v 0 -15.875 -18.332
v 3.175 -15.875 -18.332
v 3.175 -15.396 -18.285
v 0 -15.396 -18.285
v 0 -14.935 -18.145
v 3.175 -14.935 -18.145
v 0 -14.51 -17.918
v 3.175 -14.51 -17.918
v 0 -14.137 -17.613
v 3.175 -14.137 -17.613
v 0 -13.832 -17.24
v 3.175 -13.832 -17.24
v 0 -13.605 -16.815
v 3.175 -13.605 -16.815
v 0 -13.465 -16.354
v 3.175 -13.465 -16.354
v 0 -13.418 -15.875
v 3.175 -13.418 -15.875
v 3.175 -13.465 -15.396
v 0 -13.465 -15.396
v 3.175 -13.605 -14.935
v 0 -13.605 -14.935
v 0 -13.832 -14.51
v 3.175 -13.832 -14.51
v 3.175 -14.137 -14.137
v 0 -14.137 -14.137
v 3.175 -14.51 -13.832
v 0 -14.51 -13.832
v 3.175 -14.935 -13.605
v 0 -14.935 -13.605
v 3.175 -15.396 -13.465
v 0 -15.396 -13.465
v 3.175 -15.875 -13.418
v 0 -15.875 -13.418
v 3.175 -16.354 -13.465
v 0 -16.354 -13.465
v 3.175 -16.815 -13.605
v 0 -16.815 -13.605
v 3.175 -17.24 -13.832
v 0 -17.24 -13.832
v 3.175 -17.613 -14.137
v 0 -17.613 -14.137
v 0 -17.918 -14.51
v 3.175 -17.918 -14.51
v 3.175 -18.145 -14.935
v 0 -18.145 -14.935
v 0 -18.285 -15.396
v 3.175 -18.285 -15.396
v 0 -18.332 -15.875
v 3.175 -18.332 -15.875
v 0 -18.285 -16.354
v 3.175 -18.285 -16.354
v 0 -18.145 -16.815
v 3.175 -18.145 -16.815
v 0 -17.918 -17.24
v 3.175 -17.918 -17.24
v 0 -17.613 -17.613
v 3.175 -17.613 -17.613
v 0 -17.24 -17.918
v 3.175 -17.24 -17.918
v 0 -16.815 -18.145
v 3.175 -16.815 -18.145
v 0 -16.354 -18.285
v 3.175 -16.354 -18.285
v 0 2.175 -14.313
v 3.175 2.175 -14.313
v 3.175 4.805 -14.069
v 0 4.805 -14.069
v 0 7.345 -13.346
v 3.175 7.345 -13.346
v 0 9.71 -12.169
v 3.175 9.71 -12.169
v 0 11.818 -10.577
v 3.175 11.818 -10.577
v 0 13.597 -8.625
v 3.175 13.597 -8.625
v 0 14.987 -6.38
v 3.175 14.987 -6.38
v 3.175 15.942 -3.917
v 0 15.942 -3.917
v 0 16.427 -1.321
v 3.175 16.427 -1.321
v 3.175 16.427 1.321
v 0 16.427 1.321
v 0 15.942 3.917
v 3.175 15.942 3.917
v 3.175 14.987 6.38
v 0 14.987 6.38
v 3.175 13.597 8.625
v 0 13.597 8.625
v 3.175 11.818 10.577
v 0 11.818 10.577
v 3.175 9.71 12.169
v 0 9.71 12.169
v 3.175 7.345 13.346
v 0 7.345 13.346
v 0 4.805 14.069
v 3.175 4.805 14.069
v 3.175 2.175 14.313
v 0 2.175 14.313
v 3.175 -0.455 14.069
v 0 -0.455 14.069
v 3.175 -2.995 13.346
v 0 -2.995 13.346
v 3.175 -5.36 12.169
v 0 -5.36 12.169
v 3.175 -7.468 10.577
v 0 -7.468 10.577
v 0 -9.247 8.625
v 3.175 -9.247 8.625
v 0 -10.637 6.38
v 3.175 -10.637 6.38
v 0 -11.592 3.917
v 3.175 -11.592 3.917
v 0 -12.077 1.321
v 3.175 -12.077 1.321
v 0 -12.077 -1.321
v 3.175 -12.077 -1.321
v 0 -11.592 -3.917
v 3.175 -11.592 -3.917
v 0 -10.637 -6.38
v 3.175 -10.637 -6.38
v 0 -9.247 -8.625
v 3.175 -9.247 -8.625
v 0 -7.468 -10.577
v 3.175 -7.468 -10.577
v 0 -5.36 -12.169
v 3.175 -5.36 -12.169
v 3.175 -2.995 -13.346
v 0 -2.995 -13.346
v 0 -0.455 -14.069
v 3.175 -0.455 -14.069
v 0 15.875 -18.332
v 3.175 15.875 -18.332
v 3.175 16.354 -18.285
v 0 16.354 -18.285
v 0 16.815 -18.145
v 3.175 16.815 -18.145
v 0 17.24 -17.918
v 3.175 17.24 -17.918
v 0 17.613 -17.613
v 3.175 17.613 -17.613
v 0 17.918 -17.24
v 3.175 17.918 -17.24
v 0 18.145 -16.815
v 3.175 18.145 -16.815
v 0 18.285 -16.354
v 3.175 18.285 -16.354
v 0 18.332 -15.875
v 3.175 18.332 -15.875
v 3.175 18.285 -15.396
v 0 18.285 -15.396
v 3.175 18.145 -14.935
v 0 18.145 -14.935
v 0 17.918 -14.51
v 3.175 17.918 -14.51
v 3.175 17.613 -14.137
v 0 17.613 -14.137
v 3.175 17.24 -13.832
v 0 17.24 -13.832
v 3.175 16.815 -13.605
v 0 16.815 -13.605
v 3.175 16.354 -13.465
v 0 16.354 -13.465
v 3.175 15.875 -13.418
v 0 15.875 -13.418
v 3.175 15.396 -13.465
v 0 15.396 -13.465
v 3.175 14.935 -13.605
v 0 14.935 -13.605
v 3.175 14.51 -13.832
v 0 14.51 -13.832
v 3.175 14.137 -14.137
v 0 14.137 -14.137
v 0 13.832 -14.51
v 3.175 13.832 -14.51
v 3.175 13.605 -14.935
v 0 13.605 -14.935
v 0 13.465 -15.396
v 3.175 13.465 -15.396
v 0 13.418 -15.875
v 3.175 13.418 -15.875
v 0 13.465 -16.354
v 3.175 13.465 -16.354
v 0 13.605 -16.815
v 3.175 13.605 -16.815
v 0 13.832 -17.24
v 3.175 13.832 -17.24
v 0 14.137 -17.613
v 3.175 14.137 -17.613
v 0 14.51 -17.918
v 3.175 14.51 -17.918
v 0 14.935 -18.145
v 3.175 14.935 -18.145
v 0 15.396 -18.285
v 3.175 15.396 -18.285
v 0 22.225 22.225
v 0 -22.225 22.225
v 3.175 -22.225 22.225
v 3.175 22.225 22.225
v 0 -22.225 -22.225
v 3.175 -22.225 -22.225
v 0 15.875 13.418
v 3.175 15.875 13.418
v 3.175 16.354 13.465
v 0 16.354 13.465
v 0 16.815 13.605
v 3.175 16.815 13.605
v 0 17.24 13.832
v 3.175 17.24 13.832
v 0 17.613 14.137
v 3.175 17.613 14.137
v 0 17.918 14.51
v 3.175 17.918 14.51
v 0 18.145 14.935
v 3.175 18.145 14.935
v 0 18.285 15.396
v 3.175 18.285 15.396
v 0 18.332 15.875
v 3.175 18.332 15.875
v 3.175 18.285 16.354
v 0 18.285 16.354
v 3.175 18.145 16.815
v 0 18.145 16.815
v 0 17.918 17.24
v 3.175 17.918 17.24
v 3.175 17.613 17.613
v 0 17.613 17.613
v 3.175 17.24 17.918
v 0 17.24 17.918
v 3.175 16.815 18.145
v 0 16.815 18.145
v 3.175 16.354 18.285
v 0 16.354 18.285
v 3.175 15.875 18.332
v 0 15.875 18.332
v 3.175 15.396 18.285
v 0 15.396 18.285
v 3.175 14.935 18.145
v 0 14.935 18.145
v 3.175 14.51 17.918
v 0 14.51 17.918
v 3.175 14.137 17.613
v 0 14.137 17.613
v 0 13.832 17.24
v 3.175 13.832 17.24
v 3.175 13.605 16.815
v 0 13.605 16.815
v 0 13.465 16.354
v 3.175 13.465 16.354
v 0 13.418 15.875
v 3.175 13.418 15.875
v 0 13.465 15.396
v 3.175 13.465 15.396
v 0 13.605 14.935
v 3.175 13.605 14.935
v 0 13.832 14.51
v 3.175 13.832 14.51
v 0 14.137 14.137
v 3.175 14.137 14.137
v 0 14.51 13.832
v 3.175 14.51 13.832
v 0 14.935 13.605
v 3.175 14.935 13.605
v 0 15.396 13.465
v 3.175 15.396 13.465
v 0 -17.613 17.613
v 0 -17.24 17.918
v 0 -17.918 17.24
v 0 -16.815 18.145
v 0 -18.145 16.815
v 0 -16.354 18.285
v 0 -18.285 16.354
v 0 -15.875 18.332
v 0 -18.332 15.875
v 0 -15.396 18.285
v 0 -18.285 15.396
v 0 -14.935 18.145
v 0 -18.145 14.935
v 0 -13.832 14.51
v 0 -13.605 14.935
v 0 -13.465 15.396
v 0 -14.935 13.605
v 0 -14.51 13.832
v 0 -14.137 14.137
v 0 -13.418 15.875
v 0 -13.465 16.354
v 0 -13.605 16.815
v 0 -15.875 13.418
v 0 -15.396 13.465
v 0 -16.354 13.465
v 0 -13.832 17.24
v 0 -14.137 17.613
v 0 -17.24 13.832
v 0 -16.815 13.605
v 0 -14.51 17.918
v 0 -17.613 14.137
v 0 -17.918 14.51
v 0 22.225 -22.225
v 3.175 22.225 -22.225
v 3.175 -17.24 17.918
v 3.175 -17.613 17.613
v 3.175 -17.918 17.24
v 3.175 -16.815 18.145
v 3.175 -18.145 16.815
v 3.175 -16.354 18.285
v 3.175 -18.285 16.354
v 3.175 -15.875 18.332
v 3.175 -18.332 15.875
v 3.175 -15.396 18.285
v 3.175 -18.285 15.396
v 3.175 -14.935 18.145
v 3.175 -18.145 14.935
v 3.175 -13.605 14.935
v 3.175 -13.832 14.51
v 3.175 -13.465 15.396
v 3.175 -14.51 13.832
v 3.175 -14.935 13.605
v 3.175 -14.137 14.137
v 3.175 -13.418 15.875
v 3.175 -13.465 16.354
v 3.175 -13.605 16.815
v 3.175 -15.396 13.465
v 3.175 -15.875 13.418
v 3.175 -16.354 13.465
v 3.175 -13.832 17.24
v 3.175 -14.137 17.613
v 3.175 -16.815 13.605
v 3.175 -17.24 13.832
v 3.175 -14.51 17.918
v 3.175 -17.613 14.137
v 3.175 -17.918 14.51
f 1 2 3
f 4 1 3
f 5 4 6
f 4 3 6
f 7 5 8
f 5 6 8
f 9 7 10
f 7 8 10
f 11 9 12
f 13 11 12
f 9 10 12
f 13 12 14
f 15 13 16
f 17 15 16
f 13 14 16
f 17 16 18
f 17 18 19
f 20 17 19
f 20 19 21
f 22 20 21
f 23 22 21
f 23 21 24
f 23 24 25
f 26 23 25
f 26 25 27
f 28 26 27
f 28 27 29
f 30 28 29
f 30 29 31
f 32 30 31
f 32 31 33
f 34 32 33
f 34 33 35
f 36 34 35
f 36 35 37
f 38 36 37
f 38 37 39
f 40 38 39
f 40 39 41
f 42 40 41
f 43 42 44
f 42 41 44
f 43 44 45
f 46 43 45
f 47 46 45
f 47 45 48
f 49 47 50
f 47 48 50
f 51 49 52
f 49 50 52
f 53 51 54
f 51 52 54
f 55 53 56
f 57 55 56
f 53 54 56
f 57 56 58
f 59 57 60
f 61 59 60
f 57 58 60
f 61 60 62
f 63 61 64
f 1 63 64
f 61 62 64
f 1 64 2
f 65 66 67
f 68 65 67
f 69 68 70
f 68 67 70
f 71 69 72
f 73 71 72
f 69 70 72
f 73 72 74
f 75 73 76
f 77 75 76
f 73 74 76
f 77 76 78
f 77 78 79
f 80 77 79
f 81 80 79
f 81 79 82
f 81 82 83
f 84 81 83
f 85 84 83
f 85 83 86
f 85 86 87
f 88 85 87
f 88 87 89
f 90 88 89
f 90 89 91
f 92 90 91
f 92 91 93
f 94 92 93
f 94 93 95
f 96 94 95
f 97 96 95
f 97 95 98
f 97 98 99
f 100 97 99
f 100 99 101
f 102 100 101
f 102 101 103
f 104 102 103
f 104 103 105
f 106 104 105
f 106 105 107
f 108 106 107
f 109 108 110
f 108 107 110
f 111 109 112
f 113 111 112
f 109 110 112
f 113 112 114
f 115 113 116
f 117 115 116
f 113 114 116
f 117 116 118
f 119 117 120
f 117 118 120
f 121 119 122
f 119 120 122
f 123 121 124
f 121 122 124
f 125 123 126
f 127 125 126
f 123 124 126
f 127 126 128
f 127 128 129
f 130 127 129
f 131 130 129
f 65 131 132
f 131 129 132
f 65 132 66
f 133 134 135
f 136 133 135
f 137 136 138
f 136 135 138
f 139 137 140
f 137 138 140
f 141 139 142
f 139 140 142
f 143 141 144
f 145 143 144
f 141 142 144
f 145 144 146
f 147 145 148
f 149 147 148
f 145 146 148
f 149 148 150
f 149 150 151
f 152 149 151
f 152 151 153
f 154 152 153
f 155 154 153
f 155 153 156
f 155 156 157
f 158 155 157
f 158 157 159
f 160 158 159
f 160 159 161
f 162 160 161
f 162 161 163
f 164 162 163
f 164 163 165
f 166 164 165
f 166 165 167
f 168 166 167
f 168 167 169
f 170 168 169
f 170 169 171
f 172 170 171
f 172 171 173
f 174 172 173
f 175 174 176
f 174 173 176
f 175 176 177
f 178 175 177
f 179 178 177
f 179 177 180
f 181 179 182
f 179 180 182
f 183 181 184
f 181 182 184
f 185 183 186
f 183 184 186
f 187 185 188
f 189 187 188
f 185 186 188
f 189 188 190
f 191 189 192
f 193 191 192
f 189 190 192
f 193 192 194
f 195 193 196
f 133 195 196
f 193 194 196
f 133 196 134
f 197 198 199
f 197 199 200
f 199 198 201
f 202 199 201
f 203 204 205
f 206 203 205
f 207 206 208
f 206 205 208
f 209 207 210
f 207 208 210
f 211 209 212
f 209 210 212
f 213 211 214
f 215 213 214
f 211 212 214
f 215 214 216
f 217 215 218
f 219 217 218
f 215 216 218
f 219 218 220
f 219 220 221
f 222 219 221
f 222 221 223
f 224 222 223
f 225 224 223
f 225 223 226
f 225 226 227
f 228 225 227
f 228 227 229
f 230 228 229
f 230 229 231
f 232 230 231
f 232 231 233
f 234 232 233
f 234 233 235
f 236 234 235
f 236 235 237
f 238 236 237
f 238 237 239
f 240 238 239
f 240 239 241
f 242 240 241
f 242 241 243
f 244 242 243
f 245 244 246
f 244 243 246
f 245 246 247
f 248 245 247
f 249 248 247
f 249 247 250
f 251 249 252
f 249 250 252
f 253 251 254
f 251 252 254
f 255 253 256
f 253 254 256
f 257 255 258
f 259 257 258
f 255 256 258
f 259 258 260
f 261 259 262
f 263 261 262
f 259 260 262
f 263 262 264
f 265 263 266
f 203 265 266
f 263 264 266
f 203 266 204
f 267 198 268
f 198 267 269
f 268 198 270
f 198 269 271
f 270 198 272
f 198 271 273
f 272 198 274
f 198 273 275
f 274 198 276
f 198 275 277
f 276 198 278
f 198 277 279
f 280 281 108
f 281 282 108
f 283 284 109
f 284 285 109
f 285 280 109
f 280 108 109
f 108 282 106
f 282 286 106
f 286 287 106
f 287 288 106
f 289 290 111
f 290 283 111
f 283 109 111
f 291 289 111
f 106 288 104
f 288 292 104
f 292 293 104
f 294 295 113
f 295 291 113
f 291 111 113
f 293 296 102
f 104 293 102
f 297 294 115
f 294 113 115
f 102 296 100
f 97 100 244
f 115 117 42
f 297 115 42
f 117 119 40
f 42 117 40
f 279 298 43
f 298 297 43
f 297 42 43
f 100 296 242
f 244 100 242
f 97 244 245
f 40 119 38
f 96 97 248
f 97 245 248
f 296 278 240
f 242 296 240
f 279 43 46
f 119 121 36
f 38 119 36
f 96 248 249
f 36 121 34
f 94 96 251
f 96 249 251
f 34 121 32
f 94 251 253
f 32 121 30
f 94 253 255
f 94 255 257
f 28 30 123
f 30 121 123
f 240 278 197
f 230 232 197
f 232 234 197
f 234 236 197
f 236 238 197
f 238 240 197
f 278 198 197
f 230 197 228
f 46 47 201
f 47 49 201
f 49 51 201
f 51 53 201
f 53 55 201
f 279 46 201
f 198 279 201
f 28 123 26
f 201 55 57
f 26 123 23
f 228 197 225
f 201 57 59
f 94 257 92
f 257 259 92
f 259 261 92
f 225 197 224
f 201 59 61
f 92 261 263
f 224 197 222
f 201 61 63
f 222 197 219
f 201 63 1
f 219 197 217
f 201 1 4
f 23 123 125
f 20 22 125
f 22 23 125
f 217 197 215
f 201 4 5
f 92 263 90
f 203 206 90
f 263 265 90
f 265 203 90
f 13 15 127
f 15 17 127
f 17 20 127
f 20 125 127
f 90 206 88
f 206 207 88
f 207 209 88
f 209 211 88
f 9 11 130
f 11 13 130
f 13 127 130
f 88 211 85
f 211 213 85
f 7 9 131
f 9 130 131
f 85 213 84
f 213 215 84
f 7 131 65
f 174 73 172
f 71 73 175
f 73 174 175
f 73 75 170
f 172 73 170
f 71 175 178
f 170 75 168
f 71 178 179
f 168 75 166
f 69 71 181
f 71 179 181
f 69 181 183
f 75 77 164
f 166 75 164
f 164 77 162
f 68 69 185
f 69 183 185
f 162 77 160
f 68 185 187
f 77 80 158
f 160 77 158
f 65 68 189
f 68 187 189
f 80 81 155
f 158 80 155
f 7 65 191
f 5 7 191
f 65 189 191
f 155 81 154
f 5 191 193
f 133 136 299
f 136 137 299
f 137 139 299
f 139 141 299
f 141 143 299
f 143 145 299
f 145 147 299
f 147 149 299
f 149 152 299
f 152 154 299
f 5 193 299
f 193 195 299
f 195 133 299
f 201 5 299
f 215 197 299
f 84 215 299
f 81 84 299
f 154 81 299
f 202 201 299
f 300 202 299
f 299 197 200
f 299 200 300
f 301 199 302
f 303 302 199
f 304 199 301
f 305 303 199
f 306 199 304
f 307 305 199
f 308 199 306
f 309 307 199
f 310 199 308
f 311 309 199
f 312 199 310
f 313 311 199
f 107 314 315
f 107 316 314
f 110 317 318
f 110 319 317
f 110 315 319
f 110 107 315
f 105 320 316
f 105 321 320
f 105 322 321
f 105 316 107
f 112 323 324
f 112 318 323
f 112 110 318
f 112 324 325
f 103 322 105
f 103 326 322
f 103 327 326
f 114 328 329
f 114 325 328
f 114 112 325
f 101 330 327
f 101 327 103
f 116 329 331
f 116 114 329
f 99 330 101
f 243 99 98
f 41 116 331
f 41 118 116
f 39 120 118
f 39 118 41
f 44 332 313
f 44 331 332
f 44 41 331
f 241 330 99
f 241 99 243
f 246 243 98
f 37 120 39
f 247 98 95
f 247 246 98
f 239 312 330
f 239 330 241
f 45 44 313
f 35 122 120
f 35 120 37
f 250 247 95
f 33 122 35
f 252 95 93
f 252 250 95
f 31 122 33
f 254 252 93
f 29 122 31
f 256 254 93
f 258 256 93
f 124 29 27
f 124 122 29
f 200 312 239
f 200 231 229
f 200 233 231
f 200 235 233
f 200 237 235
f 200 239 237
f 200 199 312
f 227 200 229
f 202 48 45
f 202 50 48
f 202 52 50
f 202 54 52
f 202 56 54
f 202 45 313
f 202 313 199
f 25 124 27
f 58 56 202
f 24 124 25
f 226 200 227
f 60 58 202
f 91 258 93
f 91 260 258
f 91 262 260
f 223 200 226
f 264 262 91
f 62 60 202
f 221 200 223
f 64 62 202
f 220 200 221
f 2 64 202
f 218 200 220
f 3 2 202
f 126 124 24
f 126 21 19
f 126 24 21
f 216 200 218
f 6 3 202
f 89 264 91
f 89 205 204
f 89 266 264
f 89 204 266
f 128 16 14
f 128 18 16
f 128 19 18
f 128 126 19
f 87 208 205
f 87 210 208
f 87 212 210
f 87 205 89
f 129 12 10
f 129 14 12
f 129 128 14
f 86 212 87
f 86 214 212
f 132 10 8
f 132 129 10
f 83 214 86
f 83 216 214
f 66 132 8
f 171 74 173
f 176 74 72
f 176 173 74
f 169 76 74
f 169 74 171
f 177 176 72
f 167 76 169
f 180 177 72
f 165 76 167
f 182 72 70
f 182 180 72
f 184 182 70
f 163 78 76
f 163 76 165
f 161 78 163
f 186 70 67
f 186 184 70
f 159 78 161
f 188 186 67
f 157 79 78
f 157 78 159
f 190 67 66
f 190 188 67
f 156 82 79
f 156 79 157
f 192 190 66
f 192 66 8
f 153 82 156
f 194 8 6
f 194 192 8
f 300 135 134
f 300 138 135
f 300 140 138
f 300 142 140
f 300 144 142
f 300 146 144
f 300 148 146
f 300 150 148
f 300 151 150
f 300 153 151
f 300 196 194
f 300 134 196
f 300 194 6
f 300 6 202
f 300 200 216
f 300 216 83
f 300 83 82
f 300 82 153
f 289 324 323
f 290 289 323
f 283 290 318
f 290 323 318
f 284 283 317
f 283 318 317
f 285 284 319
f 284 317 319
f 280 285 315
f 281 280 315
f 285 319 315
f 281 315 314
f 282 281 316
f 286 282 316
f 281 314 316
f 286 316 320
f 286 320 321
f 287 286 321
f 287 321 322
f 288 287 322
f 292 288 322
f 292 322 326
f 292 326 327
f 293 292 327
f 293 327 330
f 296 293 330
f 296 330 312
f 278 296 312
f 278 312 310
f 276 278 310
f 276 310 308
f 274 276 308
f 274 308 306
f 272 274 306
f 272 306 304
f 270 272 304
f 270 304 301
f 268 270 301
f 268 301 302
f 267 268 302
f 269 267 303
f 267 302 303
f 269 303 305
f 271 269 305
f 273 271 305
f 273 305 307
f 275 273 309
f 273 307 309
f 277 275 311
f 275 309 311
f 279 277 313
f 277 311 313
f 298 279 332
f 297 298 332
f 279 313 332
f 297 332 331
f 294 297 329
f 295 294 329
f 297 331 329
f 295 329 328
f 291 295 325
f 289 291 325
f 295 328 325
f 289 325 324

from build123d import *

# Parameters (mm, degrees)
SKETCH1_W           = 44.45
SKETCH1_H           = 44.45
BOSS_EXTRUDE1_DEPTH = 3.175
SKETCH2_R           = 14.3129
SKETCH2_R_2         = 2.45745
CUT_EXTRUDE1_DEPTH  = 4.175


with BuildPart() as part:
    # Sketch1 → Boss-Extrude1 (new body)
    with BuildSketch(Plane(origin=(0, 0, 0), x_dir=(0, 0, -1), z_dir=(1, 0, 0))):
        Rectangle(SKETCH1_W, SKETCH1_H)
    extrude(amount=BOSS_EXTRUDE1_DEPTH)

    # Sketch2 → Cut-Extrude1 (cut, through all)
    with BuildSketch(Plane(origin=(3.175, 0, 0), x_dir=(0, 0, -1), z_dir=(1, 0, 0))):
        with Locations((0, 2.175)):
            Circle(SKETCH2_R)
        with Locations((-15.875, 15.875)):
            Circle(SKETCH2_R_2)
        with Locations((15.875, 15.875)):
            Circle(SKETCH2_R_2)
        with Locations((15.875, -15.875)):
            Circle(SKETCH2_R_2)
        with Locations((-15.875, -15.875)):
            Circle(SKETCH2_R_2)
    extrude(amount=-CUT_EXTRUDE1_DEPTH, mode=Mode.SUBTRACT)


solid = part.part
